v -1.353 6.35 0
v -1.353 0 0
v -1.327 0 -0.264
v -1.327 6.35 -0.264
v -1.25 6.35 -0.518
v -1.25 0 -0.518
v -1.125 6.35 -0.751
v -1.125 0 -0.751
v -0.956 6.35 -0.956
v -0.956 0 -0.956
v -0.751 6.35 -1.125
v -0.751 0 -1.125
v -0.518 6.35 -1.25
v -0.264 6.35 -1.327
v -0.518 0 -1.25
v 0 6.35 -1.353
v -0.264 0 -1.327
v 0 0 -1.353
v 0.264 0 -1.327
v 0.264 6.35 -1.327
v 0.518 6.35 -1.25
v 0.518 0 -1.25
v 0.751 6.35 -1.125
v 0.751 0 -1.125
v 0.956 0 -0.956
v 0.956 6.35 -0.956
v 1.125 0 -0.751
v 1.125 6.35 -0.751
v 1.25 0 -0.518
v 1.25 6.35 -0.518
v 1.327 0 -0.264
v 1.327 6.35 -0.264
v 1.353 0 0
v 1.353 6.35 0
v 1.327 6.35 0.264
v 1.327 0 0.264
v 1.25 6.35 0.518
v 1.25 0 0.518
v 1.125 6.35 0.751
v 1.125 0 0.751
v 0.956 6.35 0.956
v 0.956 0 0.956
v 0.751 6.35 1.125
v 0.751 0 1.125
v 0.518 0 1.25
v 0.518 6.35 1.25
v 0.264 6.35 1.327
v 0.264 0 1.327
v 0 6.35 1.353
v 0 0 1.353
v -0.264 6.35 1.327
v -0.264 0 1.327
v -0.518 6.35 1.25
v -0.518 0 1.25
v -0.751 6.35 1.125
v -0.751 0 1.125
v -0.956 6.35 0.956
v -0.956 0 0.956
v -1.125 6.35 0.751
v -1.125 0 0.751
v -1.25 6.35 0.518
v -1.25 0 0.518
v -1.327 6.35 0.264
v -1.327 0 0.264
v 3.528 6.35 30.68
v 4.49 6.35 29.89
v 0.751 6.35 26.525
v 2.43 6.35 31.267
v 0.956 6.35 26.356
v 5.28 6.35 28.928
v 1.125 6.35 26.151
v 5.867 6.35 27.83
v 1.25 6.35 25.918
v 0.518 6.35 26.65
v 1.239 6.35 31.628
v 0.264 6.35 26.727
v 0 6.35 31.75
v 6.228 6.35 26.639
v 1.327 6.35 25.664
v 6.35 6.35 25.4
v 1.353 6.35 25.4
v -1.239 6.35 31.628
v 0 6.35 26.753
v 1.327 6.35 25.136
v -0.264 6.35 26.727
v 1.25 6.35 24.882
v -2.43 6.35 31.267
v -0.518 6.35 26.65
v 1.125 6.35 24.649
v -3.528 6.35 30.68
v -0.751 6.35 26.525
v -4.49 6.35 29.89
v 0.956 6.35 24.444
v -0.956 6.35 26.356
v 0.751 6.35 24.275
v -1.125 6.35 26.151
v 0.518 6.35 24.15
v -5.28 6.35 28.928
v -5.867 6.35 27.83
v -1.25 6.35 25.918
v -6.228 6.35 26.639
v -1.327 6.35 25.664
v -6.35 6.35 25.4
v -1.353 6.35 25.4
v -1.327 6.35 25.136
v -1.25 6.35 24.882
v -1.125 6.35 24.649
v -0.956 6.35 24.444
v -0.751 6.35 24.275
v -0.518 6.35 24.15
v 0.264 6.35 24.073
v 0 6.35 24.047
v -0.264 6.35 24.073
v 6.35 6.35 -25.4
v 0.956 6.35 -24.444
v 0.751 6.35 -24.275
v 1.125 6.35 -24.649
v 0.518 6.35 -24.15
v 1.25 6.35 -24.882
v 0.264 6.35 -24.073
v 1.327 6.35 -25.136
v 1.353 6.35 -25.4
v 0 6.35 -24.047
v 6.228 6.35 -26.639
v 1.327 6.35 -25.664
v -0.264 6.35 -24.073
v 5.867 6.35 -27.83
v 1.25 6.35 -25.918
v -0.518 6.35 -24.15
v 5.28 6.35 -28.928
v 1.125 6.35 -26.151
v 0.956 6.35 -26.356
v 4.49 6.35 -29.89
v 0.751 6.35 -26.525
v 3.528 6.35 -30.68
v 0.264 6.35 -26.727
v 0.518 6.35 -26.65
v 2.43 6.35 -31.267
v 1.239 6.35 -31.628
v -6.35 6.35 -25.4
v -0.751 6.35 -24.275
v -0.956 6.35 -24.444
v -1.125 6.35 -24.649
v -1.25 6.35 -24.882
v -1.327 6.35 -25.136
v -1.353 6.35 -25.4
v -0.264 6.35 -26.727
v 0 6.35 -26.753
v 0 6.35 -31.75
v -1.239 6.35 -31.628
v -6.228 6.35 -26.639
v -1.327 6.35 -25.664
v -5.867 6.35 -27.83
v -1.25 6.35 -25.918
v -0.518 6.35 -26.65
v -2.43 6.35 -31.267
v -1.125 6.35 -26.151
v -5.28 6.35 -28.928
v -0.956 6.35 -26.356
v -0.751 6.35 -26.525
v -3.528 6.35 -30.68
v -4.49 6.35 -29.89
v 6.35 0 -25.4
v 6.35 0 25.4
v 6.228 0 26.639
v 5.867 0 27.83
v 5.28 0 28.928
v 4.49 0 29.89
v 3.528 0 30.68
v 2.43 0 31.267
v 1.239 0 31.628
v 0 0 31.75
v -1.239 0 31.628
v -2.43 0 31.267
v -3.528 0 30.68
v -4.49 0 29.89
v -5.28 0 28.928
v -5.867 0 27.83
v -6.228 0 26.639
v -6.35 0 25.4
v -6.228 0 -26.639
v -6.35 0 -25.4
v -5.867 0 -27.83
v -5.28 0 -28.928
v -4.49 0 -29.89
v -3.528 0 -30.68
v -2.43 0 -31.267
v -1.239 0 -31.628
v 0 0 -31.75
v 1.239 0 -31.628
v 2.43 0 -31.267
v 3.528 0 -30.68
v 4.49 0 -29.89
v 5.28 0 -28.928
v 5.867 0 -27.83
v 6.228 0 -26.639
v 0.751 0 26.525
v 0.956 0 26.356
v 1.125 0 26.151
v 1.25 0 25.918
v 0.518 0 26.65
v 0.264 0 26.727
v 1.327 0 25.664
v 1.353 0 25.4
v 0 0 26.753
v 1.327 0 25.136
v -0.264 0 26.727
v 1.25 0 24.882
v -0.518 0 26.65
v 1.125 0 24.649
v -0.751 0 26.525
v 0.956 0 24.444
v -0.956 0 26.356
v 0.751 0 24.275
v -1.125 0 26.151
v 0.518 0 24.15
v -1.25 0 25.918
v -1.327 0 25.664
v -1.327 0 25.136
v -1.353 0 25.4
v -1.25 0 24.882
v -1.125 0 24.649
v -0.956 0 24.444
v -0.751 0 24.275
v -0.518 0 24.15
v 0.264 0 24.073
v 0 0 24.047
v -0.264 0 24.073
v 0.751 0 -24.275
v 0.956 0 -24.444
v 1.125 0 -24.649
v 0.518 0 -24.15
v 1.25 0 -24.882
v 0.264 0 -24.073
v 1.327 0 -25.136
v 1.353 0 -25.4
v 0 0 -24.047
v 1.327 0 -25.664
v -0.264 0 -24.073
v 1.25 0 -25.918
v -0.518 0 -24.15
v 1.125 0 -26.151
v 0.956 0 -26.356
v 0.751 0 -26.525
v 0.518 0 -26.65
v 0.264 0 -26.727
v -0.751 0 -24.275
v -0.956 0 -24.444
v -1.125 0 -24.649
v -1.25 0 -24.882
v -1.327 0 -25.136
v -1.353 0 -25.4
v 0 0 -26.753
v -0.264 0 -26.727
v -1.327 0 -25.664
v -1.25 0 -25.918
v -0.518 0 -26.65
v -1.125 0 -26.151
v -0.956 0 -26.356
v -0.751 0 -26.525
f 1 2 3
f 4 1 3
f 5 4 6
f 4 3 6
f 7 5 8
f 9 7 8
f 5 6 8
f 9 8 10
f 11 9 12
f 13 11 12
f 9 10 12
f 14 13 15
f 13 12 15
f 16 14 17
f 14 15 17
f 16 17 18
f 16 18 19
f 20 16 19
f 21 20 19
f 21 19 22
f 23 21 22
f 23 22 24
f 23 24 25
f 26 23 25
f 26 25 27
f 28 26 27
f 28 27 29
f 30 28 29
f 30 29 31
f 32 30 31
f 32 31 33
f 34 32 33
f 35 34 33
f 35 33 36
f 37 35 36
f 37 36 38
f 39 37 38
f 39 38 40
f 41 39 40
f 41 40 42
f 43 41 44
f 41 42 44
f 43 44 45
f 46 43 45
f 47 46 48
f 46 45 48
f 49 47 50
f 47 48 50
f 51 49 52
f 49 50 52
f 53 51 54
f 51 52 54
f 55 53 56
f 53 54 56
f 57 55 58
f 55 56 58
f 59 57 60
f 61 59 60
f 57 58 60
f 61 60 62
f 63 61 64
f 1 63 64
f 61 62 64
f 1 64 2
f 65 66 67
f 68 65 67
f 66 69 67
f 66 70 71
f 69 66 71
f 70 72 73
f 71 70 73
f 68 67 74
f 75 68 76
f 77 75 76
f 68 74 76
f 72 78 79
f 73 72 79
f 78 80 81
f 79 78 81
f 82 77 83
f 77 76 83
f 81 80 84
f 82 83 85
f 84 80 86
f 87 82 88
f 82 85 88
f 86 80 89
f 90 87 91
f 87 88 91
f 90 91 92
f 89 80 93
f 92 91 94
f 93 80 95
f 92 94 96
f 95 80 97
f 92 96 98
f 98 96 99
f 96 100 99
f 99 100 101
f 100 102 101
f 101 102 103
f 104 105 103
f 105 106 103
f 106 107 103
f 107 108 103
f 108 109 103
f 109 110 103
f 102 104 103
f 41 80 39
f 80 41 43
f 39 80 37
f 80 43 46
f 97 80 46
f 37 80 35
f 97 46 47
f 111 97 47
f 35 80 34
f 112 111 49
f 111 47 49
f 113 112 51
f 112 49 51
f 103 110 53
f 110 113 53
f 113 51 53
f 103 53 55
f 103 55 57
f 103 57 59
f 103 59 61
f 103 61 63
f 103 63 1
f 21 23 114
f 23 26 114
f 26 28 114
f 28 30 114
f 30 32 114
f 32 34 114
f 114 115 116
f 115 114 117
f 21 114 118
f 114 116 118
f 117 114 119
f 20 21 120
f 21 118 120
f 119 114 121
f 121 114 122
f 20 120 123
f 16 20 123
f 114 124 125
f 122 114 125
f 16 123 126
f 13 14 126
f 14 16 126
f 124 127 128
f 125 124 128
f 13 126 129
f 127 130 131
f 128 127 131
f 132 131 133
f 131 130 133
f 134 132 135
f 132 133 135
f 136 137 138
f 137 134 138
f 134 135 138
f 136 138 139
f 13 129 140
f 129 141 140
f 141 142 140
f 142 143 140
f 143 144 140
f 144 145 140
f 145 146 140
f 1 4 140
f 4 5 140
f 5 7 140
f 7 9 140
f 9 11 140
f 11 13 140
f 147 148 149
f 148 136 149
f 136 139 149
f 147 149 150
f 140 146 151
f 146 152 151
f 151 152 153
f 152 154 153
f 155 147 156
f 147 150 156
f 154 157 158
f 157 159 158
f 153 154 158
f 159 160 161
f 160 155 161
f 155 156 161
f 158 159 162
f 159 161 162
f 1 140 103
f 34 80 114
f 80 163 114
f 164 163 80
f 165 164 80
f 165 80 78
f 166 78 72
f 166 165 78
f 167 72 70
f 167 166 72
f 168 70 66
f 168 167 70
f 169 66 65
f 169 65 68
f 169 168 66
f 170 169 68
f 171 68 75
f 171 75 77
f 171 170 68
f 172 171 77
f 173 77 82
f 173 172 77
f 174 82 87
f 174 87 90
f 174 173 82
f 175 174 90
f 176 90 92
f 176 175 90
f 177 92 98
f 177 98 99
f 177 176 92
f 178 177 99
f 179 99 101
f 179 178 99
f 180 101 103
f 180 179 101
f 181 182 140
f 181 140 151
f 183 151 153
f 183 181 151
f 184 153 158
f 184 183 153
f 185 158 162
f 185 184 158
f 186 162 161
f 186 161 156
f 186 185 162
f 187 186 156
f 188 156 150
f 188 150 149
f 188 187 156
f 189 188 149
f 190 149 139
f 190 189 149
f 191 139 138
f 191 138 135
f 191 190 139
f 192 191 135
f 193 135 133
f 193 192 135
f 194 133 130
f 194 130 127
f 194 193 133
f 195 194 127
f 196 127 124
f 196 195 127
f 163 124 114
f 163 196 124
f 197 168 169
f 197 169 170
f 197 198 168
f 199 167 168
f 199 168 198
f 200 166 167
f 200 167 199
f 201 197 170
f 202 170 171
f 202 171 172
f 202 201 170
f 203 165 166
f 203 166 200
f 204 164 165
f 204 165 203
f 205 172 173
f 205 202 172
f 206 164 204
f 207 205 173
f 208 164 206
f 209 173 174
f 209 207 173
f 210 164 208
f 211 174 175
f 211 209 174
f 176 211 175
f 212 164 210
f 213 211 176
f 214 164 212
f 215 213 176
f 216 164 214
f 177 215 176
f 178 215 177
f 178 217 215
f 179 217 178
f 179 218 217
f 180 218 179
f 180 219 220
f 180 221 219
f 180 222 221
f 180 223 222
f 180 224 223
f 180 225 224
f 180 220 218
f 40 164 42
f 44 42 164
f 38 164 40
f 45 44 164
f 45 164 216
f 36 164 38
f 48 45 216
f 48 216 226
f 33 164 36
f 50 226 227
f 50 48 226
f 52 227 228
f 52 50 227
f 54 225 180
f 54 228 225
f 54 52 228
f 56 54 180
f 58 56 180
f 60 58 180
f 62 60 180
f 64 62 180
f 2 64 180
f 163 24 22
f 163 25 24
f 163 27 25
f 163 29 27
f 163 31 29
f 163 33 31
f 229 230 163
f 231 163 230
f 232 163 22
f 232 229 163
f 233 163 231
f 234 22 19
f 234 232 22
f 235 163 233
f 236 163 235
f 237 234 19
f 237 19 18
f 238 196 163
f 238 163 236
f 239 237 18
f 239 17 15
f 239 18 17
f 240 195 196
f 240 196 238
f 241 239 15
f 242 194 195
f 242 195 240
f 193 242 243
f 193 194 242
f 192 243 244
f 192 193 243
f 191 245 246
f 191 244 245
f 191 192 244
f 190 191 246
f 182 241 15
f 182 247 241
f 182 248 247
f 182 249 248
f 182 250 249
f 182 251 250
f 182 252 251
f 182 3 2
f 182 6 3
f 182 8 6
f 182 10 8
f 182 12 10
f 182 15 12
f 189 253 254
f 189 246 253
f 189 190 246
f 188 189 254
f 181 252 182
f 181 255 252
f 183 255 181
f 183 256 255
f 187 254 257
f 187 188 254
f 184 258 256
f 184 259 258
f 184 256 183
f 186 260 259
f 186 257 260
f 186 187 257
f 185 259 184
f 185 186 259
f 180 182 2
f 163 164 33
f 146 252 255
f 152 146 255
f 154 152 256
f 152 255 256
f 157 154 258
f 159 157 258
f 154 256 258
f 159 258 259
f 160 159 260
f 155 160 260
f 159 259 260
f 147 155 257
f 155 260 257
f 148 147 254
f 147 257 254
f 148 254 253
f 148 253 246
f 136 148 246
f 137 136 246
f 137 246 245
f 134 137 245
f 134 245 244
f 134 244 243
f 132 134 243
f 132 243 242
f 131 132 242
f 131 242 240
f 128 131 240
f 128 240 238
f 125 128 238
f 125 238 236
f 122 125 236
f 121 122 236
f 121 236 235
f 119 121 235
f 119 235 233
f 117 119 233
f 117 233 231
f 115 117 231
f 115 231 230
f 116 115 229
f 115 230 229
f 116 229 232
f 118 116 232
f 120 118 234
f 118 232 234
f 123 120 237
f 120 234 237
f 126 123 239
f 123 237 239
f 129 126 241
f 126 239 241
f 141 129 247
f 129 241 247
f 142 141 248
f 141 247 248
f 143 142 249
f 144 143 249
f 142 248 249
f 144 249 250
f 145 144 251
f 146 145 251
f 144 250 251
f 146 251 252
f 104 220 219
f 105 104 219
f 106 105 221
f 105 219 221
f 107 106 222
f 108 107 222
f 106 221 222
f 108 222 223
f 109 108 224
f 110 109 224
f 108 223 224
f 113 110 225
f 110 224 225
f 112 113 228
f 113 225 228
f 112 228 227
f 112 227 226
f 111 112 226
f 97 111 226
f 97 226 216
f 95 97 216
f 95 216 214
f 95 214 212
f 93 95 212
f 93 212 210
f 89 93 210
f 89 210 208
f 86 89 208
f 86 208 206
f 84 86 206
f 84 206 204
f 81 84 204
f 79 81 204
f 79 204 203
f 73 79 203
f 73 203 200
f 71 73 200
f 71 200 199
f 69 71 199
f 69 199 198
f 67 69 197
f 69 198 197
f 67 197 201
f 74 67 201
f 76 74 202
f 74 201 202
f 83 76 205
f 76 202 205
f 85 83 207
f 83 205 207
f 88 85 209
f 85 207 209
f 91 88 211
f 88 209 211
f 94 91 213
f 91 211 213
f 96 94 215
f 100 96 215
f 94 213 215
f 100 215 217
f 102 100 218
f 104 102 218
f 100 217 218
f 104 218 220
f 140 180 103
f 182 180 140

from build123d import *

# Parameters (mm, degrees)
BOSS_EXTRUDE1_DEPTH   = 6.35
F_6_32_TAPPED_HOLE1_D = 2.7051


with BuildPart() as part:
    # Sketch1 → Boss-Extrude1 (new body)
    with BuildSketch(Plane(origin=(0, 0, 0), x_dir=(1, 0, 0), z_dir=(0, 1, 0))):
        with BuildLine():
            Line((-6.35, -25.4), (-6.35, 25.4))
            ThreePointArc((-6.35, 25.4), (0, 31.75), (6.35, 25.4))
            Line((6.35, 25.4), (6.35, -25.4))
            ThreePointArc((6.35, -25.4), (0, -31.75), (-6.35, -25.4))
        make_face()
    extrude(amount=BOSS_EXTRUDE1_DEPTH)

    # #6-32 Tapped Hole1 (through all)
    with Locations(Plane(origin=(0, 6.35, 0), x_dir=(1, 0, 0), z_dir=(0, 1, 0))):
        with Locations((0, -25.4), (0, 25.4), (0, 0)):
            Hole(F_6_32_TAPPED_HOLE1_D / 2)


solid = part.part
